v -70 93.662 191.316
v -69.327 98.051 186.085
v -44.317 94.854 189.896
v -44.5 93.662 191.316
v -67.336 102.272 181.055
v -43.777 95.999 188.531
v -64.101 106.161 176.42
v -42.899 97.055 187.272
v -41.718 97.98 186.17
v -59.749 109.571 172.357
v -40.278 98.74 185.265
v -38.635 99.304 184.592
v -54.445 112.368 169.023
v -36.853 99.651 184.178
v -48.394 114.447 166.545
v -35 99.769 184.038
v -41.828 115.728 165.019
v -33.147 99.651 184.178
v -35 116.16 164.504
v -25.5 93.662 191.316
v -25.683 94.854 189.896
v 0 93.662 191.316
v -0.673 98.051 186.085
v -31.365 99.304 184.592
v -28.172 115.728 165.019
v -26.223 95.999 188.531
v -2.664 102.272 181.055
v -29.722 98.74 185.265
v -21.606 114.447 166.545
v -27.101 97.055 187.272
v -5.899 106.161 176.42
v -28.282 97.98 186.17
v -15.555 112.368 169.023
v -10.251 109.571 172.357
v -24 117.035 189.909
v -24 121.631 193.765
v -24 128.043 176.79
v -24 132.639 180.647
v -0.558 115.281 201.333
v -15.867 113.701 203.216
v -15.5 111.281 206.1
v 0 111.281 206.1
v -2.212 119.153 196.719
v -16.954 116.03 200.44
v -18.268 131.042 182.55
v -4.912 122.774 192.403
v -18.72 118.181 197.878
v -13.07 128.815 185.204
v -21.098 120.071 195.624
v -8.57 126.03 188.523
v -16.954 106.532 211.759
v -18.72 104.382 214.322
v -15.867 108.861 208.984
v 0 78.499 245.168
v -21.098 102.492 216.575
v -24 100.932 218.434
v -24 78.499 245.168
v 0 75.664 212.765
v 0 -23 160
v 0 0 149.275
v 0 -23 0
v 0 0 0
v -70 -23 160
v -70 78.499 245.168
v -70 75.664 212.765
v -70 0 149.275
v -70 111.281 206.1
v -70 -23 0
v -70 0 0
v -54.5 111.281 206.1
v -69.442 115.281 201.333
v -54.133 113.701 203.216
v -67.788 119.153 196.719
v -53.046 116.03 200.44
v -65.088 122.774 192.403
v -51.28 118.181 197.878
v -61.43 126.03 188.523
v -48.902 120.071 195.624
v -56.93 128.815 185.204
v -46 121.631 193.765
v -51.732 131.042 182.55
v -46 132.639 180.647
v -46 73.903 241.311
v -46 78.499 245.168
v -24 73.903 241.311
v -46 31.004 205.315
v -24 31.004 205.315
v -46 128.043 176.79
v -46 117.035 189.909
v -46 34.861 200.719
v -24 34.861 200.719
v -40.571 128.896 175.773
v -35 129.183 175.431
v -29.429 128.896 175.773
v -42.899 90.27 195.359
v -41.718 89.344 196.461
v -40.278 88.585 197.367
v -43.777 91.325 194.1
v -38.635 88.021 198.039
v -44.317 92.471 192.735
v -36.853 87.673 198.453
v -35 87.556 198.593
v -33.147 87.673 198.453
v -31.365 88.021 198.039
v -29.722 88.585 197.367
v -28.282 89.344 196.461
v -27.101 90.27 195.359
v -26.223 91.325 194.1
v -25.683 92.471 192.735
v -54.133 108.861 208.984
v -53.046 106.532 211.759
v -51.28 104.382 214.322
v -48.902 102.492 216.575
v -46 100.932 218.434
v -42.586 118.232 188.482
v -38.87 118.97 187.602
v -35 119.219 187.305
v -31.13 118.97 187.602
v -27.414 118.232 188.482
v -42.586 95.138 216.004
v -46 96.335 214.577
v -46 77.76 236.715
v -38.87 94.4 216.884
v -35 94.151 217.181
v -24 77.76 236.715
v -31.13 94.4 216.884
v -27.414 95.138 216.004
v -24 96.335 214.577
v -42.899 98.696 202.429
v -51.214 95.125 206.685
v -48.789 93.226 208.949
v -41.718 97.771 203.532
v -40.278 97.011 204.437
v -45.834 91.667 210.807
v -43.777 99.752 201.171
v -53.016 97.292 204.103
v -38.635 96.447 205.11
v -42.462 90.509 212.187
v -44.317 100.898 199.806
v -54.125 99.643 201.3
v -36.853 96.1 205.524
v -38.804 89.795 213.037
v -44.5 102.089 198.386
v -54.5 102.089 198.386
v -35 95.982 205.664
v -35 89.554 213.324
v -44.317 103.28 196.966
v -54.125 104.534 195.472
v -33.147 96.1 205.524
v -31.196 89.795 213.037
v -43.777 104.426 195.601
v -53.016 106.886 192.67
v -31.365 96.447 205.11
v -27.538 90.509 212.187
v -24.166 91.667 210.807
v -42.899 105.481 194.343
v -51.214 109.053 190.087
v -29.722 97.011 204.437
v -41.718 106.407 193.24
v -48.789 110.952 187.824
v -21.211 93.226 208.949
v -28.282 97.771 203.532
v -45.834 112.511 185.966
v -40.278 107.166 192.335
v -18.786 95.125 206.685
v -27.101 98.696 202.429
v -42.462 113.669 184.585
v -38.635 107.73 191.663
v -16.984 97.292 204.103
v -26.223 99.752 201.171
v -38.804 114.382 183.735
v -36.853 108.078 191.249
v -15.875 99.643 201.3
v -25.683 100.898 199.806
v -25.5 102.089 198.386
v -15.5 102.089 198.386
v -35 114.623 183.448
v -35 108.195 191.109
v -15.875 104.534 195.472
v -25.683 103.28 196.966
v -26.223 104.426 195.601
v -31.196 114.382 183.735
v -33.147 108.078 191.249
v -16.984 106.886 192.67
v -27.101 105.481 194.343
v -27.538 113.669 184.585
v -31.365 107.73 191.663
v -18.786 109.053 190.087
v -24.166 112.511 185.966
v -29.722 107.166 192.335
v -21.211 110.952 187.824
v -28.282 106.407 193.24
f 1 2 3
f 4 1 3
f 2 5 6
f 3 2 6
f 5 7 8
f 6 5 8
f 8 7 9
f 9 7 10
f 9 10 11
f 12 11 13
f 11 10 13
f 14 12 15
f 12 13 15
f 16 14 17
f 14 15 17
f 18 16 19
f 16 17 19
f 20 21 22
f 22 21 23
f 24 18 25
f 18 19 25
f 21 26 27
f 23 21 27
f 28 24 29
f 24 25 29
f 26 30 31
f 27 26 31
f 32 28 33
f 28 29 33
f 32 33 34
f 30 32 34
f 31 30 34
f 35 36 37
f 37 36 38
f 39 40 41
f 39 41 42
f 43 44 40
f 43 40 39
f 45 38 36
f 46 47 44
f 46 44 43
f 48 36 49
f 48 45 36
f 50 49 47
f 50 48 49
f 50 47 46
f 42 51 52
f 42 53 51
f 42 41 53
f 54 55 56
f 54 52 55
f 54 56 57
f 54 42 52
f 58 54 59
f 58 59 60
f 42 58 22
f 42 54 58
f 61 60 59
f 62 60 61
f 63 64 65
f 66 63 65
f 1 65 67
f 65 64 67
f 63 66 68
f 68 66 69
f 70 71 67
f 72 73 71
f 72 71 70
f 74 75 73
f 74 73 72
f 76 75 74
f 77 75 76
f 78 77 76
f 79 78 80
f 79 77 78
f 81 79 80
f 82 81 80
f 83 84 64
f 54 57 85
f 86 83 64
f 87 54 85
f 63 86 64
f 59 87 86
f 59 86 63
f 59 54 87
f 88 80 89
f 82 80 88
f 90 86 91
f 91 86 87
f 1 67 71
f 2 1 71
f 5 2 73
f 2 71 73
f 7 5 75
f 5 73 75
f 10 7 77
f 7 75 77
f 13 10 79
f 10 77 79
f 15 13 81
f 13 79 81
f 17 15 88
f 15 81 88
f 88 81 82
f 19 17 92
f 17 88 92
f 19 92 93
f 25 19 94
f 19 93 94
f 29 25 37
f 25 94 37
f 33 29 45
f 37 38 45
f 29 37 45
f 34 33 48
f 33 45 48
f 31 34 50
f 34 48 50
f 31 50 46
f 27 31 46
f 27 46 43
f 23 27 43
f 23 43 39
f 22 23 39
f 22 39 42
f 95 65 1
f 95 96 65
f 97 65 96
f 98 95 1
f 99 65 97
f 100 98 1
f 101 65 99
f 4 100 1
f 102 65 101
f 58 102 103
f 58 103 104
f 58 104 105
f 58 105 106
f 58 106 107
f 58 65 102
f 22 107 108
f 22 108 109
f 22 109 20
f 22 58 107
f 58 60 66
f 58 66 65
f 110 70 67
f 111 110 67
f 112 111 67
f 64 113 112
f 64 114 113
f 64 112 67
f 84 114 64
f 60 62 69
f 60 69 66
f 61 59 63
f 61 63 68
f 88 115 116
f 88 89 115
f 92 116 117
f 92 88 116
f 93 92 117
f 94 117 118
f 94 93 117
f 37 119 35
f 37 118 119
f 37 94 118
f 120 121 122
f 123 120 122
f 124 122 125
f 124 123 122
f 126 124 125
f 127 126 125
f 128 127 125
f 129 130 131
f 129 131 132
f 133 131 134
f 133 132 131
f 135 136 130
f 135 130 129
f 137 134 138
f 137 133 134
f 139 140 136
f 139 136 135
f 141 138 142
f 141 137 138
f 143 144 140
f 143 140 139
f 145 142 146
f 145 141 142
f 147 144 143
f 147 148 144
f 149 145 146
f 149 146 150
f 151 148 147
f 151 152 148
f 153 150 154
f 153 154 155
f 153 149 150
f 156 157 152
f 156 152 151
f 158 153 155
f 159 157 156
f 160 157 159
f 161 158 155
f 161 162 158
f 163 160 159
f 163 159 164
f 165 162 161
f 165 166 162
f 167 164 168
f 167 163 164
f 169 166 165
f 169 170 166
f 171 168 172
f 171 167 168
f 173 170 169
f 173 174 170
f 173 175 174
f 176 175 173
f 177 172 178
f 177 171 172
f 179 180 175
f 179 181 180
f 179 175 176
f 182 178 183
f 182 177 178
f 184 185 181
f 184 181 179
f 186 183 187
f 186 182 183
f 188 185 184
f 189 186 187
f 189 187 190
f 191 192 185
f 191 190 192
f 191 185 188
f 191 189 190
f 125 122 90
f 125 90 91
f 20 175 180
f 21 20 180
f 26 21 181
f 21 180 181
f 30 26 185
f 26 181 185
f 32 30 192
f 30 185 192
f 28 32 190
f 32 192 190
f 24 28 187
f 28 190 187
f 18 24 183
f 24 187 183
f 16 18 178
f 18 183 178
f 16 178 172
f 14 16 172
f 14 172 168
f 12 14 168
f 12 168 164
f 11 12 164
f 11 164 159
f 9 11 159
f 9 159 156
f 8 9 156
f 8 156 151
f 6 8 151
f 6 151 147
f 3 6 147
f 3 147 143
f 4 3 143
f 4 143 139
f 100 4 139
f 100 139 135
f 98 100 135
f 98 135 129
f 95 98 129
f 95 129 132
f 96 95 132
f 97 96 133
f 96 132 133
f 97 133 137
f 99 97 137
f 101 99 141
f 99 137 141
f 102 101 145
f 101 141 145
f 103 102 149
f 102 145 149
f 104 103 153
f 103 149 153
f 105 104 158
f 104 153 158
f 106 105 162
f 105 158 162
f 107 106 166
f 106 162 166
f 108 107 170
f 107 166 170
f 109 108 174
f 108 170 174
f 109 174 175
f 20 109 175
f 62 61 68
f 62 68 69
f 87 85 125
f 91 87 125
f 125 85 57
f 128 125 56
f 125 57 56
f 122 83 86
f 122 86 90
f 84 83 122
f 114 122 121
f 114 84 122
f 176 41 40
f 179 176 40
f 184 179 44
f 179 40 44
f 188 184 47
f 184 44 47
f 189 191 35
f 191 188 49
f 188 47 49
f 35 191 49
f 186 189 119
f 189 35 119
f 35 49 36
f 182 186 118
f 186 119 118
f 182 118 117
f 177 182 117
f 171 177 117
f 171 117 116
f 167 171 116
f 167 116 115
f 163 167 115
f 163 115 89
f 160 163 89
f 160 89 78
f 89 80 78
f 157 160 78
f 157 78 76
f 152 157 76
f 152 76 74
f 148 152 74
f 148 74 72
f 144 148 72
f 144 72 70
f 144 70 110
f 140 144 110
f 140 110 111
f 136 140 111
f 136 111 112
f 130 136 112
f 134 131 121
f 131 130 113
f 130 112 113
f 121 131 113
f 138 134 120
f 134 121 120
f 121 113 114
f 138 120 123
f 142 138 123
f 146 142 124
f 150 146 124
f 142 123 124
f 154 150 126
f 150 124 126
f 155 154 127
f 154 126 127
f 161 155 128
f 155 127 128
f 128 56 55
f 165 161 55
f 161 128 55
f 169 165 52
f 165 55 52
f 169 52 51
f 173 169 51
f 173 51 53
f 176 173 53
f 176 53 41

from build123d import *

# Parameters (mm, degrees)
BOSS_EXTRUDE1_DEPTH = 70
BOSS_EXTRUDE2_DEPTH = 23
SKETCH3_3_R         = 9.5
CUT_EXTRUDE1_DEPTH  = 23
SKETCH3_4_R         = 19.5
SKETCH3_4_R_2       = 9.5
CUT_EXTRUDE2_DEPTH  = 12
SKETCH4_W           = 22
SKETCH4_H           = 92.60205789
CUT_EXTRUDE3_DEPTH  = 6
SKETCH5_W           = 22
SKETCH5_H           = 56
CUT_EXTRUDE4_DEPTH  = 6


with BuildPart() as part:
    # Sketch1 → Boss-Extrude1 (new body)
    with BuildSketch(Plane(origin=(0, 0, 0), x_dir=(0, 0, -1), z_dir=(1, 0, 0))):
        Polygon((0, 0), (-149.274923862, 0), (-212.764789027, 75.664274903), (-191.31554462, 93.662327975), (-206.099659643, 111.281350166), (-245.167926242, 78.499182072), (-160, -23), (0, -23), align=None)
    extrude(amount=-BOSS_EXTRUDE1_DEPTH)

    # Sketch3 → Boss-Extrude2 (add)
    with BuildSketch(Plane(origin=(0, 166.78684827, 139.950782869), x_dir=(1, 0, 0), z_dir=(0, 0.7660444431189739, 0.6427876096865442))):
        with BuildLine():
            ThreePointArc((0, -86.351225922), (-35, -51.351225922), (-70, -86.351225922))
            Line((-70, -86.351225922), (-54.5, -86.351225922))
            ThreePointArc((-54.5, -86.351225922), (-35, -105.851225922), (-15.5, -86.351225922))
            Line((-15.5, -86.351225922), (0, -86.351225922))
        make_face()
    extrude(amount=-BOSS_EXTRUDE2_DEPTH)

    # Sketch3<3> → Cut-Extrude1 (cut)
    with BuildSketch(Plane(origin=(0, 166.78684827, 139.950782869), x_dir=(1, 0, 0), z_dir=(0, 0.7660444431189739, 0.6427876096865442))):
        with Locations((-35, -86.351225922)):
            Circle(SKETCH3_3_R)
    extrude(amount=-CUT_EXTRUDE1_DEPTH, mode=Mode.SUBTRACT)

    # Sketch3<4> → Cut-Extrude2 (cut)
    with BuildSketch(Plane(origin=(0, 166.78684827, 139.950782869), x_dir=(1, 0, 0), z_dir=(0, 0.7660444431189739, 0.6427876096865442))):
        with Locations((-35, -86.351225922)):
            Circle(SKETCH3_4_R)
        with Locations((-35, -86.351225922)):
            Circle(SKETCH3_4_R_2, mode=Mode.SUBTRACT)
    extrude(amount=-CUT_EXTRUDE2_DEPTH, mode=Mode.SUBTRACT)

    # Sketch4 → Cut-Extrude3 (cut)
    with BuildSketch(Plane(origin=(0, 166.78684827, 139.950782869), x_dir=(1, 0, 0), z_dir=(0, 0.7660444431189739, 0.6427876096865442))):
        with Locations((-35, -91.050196977)):
            Rectangle(SKETCH4_W, SKETCH4_H)
    extrude(amount=-CUT_EXTRUDE3_DEPTH, mode=Mode.SUBTRACT)

    # Sketch5 → Cut-Extrude4 (cut)
    with BuildSketch(Plane(origin=(0, -88.287666198, 105.217143373), x_dir=(1, 0, 0), z_dir=(0, -0.6427876096865438, 0.7660444431189745))):
        with Locations((-35, 183.724767497)):
            Rectangle(SKETCH5_W, SKETCH5_H)
    extrude(amount=-CUT_EXTRUDE4_DEPTH, mode=Mode.SUBTRACT)


solid = part.part
